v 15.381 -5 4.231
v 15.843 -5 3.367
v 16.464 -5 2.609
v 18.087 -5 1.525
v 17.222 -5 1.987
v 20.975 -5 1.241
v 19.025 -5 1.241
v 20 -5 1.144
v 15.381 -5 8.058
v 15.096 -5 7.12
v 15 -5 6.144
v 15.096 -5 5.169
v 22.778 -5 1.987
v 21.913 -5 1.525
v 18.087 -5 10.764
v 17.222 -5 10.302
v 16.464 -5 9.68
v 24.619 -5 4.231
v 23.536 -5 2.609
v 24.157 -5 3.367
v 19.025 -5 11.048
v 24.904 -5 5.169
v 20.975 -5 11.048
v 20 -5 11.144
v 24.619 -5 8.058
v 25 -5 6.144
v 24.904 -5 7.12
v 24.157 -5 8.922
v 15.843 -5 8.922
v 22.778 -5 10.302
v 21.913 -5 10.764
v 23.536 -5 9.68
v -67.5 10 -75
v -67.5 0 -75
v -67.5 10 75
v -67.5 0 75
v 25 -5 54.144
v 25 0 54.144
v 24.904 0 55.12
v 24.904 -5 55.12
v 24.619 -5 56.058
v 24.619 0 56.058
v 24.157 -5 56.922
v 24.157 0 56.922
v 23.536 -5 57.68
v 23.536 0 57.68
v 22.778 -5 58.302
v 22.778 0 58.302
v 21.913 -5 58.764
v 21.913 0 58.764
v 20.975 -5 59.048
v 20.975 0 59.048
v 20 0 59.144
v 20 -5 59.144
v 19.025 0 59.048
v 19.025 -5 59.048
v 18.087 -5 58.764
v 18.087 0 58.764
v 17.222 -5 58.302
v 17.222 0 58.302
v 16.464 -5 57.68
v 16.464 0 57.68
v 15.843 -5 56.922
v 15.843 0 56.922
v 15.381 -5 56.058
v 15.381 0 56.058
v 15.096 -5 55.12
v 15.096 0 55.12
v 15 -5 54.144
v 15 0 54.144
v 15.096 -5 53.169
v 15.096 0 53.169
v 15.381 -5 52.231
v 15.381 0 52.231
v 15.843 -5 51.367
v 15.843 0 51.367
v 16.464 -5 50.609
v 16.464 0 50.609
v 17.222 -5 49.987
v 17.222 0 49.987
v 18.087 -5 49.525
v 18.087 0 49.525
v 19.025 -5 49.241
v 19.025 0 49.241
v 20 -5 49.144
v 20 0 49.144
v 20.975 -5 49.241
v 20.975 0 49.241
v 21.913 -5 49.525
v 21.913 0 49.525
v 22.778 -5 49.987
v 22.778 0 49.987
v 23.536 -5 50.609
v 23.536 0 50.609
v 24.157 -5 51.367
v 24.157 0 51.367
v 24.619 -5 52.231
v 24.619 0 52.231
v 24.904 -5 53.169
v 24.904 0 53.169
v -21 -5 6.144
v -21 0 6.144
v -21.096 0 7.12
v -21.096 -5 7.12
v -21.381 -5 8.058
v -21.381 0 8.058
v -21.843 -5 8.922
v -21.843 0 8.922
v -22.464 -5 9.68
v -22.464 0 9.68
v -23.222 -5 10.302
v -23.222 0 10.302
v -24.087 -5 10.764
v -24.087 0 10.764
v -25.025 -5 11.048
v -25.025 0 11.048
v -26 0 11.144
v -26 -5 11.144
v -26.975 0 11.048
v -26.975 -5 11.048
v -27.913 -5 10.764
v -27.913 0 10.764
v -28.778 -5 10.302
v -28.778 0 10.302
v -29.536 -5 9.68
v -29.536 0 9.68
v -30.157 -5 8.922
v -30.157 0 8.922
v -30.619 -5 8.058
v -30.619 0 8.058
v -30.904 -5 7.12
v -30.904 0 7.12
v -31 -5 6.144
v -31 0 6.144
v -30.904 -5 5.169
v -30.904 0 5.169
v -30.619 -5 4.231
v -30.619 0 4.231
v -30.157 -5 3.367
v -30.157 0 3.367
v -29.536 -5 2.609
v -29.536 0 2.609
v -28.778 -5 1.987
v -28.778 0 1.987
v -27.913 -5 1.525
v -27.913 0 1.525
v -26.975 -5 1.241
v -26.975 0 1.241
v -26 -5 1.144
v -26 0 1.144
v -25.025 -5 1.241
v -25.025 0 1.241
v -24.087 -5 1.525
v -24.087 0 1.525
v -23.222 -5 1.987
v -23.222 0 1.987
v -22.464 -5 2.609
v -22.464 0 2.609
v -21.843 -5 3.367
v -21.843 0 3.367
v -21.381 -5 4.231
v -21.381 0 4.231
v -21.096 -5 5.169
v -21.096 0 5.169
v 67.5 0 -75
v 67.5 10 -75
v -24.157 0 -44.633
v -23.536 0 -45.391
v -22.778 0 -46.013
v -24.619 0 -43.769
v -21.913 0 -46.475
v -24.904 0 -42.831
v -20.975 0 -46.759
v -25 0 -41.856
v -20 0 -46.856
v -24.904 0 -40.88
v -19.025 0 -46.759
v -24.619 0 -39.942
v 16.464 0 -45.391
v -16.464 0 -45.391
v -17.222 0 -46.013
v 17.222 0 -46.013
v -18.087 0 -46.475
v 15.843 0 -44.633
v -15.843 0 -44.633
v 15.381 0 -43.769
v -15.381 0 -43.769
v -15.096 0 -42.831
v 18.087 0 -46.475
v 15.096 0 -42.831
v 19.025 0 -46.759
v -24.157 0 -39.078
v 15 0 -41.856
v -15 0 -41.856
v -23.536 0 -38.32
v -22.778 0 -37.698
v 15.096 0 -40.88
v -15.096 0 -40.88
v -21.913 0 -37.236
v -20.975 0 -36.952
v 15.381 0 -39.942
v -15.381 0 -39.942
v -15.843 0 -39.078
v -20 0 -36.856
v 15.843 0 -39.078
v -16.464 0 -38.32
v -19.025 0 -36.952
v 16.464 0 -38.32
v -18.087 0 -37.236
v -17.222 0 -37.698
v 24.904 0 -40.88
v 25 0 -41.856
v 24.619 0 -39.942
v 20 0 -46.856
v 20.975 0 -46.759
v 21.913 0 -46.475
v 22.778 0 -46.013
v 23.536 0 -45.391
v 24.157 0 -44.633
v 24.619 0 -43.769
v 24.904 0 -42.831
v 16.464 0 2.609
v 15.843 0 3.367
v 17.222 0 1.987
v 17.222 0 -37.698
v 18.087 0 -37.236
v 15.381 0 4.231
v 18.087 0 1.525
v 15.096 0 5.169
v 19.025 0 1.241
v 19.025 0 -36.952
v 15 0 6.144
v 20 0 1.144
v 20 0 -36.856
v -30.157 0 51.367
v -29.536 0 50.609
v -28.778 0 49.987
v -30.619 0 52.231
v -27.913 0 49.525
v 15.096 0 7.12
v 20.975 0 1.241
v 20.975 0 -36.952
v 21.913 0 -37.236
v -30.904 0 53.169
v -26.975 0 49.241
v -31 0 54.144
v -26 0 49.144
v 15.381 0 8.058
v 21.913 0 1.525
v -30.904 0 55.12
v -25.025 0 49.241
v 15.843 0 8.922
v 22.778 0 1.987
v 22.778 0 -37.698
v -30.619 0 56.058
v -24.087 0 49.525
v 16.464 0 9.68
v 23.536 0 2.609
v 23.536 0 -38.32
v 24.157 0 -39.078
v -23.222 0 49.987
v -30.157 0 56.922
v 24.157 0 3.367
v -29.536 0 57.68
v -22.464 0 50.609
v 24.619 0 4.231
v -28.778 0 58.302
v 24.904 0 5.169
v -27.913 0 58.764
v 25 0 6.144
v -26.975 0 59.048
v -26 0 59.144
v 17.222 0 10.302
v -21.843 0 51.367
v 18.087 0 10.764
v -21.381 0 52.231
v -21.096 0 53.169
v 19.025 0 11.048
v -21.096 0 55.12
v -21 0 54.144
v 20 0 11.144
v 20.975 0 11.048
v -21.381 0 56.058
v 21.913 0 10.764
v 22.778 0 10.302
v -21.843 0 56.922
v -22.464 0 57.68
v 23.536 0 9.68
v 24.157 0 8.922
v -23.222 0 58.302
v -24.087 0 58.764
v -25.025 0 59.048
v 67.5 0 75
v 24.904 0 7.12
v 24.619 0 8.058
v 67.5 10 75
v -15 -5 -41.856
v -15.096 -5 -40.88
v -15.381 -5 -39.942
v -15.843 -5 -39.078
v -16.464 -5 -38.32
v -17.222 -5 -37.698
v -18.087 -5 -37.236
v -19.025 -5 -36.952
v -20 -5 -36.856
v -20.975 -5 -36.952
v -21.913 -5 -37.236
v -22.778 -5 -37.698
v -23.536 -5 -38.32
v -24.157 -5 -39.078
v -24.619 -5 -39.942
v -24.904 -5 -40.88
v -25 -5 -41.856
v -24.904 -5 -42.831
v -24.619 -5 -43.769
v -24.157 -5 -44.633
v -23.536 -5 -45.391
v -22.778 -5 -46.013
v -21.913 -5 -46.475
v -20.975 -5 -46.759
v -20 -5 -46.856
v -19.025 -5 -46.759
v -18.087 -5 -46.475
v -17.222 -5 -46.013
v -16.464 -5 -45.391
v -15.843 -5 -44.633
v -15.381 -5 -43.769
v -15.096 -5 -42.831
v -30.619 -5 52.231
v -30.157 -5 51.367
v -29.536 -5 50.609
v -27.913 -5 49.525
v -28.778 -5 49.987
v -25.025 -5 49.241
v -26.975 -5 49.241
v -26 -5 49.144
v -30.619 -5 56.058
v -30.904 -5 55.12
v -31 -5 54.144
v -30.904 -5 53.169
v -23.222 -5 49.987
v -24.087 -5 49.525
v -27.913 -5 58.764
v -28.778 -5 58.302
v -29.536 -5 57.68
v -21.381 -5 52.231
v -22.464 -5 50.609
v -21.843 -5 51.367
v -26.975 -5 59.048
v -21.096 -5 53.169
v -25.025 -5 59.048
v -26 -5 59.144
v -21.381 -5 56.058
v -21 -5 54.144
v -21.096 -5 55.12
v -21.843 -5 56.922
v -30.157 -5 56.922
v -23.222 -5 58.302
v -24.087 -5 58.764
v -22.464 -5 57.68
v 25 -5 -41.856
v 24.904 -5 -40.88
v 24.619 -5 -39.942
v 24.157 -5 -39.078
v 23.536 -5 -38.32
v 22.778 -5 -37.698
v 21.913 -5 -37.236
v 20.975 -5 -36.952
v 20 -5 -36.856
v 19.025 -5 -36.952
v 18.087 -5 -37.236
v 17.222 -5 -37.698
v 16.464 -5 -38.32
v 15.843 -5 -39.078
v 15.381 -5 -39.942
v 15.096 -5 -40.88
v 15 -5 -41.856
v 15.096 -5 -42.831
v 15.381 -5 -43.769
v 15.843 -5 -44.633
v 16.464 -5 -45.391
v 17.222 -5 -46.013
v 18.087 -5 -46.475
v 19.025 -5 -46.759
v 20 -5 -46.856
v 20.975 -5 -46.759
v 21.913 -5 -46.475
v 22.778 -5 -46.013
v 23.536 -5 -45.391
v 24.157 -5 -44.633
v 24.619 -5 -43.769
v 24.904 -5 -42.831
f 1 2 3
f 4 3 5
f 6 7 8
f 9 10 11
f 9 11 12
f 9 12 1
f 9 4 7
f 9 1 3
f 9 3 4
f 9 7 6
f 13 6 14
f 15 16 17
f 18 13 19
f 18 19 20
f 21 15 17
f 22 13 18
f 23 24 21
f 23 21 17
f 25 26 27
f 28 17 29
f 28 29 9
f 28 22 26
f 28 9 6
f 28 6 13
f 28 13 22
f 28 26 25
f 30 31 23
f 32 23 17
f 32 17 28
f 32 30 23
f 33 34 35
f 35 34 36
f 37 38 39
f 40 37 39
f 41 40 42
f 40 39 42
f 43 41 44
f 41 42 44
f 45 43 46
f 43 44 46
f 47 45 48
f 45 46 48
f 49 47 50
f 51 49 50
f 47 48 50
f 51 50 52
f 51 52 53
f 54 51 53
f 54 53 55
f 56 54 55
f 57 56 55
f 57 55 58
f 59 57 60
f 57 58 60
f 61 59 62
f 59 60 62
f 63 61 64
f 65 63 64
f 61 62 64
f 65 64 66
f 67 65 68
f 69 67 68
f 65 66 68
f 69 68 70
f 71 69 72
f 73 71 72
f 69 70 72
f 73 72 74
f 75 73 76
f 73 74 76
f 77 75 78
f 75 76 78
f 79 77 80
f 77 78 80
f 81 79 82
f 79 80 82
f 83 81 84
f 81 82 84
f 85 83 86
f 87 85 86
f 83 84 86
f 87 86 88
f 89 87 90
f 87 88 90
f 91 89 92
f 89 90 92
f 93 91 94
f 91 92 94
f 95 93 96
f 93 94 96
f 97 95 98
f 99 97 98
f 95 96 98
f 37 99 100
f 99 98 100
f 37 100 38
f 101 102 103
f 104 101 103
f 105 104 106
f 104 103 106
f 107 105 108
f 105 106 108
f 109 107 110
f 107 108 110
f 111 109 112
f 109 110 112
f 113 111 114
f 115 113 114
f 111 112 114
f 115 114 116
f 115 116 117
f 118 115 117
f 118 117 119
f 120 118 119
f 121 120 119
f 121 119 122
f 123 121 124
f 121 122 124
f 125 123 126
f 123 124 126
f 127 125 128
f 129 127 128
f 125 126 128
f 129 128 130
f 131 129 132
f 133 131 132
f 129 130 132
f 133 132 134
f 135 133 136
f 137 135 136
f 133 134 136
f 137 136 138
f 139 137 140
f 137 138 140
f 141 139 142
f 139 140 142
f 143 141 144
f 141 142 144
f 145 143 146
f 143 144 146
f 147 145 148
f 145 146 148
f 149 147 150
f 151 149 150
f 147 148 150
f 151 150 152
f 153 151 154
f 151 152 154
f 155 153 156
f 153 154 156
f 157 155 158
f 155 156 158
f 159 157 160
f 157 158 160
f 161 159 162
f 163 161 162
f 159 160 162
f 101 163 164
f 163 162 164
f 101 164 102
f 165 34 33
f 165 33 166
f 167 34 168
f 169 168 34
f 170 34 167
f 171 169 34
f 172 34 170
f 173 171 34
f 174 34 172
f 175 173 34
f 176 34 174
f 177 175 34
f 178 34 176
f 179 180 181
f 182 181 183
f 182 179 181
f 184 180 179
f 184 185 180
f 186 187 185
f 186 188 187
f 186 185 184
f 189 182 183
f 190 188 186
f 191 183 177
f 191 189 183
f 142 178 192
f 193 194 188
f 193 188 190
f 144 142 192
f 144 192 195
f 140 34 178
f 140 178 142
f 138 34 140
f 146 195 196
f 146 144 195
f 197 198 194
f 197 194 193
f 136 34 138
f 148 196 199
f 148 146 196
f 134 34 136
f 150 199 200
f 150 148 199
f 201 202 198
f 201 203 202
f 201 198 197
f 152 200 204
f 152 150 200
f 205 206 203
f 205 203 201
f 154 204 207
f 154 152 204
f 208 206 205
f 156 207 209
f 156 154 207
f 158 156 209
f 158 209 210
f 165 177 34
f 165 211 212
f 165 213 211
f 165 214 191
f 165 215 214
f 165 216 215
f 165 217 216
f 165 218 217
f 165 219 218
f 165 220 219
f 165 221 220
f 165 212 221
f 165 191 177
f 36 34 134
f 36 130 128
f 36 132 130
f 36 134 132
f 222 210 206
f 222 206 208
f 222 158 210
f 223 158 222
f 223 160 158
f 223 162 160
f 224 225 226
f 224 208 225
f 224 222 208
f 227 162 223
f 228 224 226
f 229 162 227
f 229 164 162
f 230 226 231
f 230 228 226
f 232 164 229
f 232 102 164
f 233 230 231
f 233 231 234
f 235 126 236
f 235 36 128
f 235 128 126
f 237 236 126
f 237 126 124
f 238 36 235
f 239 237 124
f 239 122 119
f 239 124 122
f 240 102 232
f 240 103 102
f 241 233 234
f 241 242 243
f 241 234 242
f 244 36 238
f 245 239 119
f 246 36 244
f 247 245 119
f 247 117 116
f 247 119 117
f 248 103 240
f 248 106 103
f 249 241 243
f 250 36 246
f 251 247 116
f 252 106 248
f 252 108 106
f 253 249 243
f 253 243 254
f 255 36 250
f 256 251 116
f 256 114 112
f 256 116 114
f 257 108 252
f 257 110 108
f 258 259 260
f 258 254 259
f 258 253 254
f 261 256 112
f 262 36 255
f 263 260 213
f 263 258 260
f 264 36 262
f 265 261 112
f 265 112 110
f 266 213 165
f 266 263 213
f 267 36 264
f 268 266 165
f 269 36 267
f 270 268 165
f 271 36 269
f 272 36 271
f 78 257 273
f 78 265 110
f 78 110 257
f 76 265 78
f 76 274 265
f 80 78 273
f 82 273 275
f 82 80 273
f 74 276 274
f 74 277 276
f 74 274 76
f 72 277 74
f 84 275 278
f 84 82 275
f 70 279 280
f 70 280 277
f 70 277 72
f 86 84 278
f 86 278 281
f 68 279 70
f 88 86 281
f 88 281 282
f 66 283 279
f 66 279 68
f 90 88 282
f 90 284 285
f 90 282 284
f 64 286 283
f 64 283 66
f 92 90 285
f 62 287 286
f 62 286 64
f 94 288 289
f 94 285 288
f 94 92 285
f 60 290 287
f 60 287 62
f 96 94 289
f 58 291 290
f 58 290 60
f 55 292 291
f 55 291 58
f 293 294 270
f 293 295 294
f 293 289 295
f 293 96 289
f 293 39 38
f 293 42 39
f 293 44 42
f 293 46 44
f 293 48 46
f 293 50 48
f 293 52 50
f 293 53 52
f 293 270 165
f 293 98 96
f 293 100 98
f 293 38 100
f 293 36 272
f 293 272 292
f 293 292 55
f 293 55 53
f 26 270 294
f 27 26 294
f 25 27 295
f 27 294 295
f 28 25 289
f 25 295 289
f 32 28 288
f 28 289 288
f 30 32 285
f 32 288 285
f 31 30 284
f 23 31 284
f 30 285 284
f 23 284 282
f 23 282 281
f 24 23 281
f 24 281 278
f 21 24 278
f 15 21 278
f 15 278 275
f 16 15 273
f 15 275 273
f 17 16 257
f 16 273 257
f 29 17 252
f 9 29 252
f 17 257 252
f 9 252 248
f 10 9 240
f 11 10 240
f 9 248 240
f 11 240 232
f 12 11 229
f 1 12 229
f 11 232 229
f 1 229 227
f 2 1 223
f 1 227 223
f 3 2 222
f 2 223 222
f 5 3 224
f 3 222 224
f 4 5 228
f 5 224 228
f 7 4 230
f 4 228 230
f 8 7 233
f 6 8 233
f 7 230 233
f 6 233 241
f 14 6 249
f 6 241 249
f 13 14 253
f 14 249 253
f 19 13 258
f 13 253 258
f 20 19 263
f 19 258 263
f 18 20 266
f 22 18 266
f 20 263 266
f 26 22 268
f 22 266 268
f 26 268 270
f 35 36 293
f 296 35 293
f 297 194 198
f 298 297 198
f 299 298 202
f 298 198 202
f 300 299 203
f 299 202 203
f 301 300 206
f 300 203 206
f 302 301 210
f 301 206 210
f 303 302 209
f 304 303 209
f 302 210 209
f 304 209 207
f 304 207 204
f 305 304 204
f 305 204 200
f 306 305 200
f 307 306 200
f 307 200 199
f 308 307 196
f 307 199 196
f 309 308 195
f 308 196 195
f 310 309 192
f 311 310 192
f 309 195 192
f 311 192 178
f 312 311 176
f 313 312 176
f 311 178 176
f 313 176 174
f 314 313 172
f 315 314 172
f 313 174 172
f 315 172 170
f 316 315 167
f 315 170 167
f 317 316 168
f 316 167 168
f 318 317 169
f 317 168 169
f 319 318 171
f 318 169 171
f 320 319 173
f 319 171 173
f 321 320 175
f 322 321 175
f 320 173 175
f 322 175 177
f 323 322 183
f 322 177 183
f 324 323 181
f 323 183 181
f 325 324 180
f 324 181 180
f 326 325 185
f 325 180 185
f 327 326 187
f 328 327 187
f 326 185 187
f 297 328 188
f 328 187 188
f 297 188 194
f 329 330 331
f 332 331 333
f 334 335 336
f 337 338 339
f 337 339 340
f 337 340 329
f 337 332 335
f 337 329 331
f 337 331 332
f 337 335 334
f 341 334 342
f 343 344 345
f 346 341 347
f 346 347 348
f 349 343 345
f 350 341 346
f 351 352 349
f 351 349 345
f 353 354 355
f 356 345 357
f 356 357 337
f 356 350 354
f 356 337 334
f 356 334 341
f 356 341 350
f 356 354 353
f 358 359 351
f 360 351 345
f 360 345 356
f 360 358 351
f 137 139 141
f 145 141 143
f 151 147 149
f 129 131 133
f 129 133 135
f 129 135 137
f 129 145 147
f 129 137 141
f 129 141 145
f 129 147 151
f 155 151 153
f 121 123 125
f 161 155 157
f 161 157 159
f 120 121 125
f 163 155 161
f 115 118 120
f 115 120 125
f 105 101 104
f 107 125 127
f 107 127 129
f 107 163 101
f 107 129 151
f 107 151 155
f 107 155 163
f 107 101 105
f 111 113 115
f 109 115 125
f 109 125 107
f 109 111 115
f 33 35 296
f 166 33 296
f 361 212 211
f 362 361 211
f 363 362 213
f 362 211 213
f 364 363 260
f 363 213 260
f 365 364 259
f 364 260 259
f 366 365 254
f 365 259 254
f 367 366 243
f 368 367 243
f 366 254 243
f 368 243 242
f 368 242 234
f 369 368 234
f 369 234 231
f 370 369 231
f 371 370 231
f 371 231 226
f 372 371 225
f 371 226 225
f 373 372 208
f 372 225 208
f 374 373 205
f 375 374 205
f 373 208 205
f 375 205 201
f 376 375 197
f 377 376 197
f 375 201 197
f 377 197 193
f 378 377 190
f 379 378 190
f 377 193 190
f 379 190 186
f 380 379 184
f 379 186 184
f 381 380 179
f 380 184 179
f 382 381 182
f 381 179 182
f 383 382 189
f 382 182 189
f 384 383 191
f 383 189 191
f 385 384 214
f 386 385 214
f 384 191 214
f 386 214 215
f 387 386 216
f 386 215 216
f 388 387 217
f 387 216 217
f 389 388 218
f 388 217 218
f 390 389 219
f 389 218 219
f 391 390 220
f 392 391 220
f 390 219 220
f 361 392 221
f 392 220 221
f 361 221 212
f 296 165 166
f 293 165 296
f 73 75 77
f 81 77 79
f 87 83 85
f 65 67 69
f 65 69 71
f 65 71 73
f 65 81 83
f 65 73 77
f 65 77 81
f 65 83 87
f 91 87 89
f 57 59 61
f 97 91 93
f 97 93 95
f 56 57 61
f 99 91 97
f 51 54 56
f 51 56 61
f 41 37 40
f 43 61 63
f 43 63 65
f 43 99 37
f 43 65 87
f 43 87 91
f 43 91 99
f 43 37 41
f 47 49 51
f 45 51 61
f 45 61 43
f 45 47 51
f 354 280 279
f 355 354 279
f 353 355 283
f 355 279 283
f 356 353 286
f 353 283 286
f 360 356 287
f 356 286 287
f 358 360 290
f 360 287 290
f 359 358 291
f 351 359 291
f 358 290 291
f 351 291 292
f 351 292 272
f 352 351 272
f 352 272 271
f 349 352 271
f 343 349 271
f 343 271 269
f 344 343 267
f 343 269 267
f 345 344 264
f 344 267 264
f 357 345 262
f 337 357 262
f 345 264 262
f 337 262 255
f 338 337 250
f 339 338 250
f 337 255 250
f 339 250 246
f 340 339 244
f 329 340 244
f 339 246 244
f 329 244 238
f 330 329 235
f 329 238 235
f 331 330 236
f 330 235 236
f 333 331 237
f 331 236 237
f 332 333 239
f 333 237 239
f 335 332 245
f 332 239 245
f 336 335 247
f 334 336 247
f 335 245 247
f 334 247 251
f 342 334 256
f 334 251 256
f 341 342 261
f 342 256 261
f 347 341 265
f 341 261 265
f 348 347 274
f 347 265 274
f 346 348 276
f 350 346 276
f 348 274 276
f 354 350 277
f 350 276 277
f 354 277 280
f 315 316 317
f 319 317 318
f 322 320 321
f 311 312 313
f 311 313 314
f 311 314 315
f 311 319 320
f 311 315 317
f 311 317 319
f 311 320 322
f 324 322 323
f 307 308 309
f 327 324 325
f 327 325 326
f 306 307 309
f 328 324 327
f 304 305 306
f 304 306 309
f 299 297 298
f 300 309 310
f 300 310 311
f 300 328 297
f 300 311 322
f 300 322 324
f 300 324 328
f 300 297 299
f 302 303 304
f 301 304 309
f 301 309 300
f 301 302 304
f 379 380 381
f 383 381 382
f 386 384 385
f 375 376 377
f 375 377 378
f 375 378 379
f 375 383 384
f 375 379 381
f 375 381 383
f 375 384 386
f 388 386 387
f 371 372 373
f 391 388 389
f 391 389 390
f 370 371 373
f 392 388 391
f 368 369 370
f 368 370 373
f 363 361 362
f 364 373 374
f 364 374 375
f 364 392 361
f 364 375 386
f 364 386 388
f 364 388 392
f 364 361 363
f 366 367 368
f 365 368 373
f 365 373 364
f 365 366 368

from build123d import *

# Parameters (mm, degrees)
F0_W     = 135
F0_H     = 150
F1_DEPTH = 10
F2_R     = 5
F3_DEPTH = 5


with BuildPart() as f1:
    # F0 (on Front) → F1 (new body)
    with BuildSketch(Plane.XZ):
        Rectangle(F0_W, F0_H)
    extrude(amount=-F1_DEPTH)

    # F2 (on face) → F3 (join)
    with BuildSketch(Plane.XZ):
        with Locations((-20, -41.855509)):
            Circle(F2_R)
        with Locations((20, -41.855509)):
            Circle(F2_R)
        with Locations((20, 6.144491)):
            Circle(F2_R)
        with Locations((-26, 6.144491)):
            Circle(F2_R)
        with Locations((-26, 54.144491)):
            Circle(F2_R)
        with Locations((20, 54.144491)):
            Circle(F2_R)
    extrude(amount=F3_DEPTH)


solid = f1.part
